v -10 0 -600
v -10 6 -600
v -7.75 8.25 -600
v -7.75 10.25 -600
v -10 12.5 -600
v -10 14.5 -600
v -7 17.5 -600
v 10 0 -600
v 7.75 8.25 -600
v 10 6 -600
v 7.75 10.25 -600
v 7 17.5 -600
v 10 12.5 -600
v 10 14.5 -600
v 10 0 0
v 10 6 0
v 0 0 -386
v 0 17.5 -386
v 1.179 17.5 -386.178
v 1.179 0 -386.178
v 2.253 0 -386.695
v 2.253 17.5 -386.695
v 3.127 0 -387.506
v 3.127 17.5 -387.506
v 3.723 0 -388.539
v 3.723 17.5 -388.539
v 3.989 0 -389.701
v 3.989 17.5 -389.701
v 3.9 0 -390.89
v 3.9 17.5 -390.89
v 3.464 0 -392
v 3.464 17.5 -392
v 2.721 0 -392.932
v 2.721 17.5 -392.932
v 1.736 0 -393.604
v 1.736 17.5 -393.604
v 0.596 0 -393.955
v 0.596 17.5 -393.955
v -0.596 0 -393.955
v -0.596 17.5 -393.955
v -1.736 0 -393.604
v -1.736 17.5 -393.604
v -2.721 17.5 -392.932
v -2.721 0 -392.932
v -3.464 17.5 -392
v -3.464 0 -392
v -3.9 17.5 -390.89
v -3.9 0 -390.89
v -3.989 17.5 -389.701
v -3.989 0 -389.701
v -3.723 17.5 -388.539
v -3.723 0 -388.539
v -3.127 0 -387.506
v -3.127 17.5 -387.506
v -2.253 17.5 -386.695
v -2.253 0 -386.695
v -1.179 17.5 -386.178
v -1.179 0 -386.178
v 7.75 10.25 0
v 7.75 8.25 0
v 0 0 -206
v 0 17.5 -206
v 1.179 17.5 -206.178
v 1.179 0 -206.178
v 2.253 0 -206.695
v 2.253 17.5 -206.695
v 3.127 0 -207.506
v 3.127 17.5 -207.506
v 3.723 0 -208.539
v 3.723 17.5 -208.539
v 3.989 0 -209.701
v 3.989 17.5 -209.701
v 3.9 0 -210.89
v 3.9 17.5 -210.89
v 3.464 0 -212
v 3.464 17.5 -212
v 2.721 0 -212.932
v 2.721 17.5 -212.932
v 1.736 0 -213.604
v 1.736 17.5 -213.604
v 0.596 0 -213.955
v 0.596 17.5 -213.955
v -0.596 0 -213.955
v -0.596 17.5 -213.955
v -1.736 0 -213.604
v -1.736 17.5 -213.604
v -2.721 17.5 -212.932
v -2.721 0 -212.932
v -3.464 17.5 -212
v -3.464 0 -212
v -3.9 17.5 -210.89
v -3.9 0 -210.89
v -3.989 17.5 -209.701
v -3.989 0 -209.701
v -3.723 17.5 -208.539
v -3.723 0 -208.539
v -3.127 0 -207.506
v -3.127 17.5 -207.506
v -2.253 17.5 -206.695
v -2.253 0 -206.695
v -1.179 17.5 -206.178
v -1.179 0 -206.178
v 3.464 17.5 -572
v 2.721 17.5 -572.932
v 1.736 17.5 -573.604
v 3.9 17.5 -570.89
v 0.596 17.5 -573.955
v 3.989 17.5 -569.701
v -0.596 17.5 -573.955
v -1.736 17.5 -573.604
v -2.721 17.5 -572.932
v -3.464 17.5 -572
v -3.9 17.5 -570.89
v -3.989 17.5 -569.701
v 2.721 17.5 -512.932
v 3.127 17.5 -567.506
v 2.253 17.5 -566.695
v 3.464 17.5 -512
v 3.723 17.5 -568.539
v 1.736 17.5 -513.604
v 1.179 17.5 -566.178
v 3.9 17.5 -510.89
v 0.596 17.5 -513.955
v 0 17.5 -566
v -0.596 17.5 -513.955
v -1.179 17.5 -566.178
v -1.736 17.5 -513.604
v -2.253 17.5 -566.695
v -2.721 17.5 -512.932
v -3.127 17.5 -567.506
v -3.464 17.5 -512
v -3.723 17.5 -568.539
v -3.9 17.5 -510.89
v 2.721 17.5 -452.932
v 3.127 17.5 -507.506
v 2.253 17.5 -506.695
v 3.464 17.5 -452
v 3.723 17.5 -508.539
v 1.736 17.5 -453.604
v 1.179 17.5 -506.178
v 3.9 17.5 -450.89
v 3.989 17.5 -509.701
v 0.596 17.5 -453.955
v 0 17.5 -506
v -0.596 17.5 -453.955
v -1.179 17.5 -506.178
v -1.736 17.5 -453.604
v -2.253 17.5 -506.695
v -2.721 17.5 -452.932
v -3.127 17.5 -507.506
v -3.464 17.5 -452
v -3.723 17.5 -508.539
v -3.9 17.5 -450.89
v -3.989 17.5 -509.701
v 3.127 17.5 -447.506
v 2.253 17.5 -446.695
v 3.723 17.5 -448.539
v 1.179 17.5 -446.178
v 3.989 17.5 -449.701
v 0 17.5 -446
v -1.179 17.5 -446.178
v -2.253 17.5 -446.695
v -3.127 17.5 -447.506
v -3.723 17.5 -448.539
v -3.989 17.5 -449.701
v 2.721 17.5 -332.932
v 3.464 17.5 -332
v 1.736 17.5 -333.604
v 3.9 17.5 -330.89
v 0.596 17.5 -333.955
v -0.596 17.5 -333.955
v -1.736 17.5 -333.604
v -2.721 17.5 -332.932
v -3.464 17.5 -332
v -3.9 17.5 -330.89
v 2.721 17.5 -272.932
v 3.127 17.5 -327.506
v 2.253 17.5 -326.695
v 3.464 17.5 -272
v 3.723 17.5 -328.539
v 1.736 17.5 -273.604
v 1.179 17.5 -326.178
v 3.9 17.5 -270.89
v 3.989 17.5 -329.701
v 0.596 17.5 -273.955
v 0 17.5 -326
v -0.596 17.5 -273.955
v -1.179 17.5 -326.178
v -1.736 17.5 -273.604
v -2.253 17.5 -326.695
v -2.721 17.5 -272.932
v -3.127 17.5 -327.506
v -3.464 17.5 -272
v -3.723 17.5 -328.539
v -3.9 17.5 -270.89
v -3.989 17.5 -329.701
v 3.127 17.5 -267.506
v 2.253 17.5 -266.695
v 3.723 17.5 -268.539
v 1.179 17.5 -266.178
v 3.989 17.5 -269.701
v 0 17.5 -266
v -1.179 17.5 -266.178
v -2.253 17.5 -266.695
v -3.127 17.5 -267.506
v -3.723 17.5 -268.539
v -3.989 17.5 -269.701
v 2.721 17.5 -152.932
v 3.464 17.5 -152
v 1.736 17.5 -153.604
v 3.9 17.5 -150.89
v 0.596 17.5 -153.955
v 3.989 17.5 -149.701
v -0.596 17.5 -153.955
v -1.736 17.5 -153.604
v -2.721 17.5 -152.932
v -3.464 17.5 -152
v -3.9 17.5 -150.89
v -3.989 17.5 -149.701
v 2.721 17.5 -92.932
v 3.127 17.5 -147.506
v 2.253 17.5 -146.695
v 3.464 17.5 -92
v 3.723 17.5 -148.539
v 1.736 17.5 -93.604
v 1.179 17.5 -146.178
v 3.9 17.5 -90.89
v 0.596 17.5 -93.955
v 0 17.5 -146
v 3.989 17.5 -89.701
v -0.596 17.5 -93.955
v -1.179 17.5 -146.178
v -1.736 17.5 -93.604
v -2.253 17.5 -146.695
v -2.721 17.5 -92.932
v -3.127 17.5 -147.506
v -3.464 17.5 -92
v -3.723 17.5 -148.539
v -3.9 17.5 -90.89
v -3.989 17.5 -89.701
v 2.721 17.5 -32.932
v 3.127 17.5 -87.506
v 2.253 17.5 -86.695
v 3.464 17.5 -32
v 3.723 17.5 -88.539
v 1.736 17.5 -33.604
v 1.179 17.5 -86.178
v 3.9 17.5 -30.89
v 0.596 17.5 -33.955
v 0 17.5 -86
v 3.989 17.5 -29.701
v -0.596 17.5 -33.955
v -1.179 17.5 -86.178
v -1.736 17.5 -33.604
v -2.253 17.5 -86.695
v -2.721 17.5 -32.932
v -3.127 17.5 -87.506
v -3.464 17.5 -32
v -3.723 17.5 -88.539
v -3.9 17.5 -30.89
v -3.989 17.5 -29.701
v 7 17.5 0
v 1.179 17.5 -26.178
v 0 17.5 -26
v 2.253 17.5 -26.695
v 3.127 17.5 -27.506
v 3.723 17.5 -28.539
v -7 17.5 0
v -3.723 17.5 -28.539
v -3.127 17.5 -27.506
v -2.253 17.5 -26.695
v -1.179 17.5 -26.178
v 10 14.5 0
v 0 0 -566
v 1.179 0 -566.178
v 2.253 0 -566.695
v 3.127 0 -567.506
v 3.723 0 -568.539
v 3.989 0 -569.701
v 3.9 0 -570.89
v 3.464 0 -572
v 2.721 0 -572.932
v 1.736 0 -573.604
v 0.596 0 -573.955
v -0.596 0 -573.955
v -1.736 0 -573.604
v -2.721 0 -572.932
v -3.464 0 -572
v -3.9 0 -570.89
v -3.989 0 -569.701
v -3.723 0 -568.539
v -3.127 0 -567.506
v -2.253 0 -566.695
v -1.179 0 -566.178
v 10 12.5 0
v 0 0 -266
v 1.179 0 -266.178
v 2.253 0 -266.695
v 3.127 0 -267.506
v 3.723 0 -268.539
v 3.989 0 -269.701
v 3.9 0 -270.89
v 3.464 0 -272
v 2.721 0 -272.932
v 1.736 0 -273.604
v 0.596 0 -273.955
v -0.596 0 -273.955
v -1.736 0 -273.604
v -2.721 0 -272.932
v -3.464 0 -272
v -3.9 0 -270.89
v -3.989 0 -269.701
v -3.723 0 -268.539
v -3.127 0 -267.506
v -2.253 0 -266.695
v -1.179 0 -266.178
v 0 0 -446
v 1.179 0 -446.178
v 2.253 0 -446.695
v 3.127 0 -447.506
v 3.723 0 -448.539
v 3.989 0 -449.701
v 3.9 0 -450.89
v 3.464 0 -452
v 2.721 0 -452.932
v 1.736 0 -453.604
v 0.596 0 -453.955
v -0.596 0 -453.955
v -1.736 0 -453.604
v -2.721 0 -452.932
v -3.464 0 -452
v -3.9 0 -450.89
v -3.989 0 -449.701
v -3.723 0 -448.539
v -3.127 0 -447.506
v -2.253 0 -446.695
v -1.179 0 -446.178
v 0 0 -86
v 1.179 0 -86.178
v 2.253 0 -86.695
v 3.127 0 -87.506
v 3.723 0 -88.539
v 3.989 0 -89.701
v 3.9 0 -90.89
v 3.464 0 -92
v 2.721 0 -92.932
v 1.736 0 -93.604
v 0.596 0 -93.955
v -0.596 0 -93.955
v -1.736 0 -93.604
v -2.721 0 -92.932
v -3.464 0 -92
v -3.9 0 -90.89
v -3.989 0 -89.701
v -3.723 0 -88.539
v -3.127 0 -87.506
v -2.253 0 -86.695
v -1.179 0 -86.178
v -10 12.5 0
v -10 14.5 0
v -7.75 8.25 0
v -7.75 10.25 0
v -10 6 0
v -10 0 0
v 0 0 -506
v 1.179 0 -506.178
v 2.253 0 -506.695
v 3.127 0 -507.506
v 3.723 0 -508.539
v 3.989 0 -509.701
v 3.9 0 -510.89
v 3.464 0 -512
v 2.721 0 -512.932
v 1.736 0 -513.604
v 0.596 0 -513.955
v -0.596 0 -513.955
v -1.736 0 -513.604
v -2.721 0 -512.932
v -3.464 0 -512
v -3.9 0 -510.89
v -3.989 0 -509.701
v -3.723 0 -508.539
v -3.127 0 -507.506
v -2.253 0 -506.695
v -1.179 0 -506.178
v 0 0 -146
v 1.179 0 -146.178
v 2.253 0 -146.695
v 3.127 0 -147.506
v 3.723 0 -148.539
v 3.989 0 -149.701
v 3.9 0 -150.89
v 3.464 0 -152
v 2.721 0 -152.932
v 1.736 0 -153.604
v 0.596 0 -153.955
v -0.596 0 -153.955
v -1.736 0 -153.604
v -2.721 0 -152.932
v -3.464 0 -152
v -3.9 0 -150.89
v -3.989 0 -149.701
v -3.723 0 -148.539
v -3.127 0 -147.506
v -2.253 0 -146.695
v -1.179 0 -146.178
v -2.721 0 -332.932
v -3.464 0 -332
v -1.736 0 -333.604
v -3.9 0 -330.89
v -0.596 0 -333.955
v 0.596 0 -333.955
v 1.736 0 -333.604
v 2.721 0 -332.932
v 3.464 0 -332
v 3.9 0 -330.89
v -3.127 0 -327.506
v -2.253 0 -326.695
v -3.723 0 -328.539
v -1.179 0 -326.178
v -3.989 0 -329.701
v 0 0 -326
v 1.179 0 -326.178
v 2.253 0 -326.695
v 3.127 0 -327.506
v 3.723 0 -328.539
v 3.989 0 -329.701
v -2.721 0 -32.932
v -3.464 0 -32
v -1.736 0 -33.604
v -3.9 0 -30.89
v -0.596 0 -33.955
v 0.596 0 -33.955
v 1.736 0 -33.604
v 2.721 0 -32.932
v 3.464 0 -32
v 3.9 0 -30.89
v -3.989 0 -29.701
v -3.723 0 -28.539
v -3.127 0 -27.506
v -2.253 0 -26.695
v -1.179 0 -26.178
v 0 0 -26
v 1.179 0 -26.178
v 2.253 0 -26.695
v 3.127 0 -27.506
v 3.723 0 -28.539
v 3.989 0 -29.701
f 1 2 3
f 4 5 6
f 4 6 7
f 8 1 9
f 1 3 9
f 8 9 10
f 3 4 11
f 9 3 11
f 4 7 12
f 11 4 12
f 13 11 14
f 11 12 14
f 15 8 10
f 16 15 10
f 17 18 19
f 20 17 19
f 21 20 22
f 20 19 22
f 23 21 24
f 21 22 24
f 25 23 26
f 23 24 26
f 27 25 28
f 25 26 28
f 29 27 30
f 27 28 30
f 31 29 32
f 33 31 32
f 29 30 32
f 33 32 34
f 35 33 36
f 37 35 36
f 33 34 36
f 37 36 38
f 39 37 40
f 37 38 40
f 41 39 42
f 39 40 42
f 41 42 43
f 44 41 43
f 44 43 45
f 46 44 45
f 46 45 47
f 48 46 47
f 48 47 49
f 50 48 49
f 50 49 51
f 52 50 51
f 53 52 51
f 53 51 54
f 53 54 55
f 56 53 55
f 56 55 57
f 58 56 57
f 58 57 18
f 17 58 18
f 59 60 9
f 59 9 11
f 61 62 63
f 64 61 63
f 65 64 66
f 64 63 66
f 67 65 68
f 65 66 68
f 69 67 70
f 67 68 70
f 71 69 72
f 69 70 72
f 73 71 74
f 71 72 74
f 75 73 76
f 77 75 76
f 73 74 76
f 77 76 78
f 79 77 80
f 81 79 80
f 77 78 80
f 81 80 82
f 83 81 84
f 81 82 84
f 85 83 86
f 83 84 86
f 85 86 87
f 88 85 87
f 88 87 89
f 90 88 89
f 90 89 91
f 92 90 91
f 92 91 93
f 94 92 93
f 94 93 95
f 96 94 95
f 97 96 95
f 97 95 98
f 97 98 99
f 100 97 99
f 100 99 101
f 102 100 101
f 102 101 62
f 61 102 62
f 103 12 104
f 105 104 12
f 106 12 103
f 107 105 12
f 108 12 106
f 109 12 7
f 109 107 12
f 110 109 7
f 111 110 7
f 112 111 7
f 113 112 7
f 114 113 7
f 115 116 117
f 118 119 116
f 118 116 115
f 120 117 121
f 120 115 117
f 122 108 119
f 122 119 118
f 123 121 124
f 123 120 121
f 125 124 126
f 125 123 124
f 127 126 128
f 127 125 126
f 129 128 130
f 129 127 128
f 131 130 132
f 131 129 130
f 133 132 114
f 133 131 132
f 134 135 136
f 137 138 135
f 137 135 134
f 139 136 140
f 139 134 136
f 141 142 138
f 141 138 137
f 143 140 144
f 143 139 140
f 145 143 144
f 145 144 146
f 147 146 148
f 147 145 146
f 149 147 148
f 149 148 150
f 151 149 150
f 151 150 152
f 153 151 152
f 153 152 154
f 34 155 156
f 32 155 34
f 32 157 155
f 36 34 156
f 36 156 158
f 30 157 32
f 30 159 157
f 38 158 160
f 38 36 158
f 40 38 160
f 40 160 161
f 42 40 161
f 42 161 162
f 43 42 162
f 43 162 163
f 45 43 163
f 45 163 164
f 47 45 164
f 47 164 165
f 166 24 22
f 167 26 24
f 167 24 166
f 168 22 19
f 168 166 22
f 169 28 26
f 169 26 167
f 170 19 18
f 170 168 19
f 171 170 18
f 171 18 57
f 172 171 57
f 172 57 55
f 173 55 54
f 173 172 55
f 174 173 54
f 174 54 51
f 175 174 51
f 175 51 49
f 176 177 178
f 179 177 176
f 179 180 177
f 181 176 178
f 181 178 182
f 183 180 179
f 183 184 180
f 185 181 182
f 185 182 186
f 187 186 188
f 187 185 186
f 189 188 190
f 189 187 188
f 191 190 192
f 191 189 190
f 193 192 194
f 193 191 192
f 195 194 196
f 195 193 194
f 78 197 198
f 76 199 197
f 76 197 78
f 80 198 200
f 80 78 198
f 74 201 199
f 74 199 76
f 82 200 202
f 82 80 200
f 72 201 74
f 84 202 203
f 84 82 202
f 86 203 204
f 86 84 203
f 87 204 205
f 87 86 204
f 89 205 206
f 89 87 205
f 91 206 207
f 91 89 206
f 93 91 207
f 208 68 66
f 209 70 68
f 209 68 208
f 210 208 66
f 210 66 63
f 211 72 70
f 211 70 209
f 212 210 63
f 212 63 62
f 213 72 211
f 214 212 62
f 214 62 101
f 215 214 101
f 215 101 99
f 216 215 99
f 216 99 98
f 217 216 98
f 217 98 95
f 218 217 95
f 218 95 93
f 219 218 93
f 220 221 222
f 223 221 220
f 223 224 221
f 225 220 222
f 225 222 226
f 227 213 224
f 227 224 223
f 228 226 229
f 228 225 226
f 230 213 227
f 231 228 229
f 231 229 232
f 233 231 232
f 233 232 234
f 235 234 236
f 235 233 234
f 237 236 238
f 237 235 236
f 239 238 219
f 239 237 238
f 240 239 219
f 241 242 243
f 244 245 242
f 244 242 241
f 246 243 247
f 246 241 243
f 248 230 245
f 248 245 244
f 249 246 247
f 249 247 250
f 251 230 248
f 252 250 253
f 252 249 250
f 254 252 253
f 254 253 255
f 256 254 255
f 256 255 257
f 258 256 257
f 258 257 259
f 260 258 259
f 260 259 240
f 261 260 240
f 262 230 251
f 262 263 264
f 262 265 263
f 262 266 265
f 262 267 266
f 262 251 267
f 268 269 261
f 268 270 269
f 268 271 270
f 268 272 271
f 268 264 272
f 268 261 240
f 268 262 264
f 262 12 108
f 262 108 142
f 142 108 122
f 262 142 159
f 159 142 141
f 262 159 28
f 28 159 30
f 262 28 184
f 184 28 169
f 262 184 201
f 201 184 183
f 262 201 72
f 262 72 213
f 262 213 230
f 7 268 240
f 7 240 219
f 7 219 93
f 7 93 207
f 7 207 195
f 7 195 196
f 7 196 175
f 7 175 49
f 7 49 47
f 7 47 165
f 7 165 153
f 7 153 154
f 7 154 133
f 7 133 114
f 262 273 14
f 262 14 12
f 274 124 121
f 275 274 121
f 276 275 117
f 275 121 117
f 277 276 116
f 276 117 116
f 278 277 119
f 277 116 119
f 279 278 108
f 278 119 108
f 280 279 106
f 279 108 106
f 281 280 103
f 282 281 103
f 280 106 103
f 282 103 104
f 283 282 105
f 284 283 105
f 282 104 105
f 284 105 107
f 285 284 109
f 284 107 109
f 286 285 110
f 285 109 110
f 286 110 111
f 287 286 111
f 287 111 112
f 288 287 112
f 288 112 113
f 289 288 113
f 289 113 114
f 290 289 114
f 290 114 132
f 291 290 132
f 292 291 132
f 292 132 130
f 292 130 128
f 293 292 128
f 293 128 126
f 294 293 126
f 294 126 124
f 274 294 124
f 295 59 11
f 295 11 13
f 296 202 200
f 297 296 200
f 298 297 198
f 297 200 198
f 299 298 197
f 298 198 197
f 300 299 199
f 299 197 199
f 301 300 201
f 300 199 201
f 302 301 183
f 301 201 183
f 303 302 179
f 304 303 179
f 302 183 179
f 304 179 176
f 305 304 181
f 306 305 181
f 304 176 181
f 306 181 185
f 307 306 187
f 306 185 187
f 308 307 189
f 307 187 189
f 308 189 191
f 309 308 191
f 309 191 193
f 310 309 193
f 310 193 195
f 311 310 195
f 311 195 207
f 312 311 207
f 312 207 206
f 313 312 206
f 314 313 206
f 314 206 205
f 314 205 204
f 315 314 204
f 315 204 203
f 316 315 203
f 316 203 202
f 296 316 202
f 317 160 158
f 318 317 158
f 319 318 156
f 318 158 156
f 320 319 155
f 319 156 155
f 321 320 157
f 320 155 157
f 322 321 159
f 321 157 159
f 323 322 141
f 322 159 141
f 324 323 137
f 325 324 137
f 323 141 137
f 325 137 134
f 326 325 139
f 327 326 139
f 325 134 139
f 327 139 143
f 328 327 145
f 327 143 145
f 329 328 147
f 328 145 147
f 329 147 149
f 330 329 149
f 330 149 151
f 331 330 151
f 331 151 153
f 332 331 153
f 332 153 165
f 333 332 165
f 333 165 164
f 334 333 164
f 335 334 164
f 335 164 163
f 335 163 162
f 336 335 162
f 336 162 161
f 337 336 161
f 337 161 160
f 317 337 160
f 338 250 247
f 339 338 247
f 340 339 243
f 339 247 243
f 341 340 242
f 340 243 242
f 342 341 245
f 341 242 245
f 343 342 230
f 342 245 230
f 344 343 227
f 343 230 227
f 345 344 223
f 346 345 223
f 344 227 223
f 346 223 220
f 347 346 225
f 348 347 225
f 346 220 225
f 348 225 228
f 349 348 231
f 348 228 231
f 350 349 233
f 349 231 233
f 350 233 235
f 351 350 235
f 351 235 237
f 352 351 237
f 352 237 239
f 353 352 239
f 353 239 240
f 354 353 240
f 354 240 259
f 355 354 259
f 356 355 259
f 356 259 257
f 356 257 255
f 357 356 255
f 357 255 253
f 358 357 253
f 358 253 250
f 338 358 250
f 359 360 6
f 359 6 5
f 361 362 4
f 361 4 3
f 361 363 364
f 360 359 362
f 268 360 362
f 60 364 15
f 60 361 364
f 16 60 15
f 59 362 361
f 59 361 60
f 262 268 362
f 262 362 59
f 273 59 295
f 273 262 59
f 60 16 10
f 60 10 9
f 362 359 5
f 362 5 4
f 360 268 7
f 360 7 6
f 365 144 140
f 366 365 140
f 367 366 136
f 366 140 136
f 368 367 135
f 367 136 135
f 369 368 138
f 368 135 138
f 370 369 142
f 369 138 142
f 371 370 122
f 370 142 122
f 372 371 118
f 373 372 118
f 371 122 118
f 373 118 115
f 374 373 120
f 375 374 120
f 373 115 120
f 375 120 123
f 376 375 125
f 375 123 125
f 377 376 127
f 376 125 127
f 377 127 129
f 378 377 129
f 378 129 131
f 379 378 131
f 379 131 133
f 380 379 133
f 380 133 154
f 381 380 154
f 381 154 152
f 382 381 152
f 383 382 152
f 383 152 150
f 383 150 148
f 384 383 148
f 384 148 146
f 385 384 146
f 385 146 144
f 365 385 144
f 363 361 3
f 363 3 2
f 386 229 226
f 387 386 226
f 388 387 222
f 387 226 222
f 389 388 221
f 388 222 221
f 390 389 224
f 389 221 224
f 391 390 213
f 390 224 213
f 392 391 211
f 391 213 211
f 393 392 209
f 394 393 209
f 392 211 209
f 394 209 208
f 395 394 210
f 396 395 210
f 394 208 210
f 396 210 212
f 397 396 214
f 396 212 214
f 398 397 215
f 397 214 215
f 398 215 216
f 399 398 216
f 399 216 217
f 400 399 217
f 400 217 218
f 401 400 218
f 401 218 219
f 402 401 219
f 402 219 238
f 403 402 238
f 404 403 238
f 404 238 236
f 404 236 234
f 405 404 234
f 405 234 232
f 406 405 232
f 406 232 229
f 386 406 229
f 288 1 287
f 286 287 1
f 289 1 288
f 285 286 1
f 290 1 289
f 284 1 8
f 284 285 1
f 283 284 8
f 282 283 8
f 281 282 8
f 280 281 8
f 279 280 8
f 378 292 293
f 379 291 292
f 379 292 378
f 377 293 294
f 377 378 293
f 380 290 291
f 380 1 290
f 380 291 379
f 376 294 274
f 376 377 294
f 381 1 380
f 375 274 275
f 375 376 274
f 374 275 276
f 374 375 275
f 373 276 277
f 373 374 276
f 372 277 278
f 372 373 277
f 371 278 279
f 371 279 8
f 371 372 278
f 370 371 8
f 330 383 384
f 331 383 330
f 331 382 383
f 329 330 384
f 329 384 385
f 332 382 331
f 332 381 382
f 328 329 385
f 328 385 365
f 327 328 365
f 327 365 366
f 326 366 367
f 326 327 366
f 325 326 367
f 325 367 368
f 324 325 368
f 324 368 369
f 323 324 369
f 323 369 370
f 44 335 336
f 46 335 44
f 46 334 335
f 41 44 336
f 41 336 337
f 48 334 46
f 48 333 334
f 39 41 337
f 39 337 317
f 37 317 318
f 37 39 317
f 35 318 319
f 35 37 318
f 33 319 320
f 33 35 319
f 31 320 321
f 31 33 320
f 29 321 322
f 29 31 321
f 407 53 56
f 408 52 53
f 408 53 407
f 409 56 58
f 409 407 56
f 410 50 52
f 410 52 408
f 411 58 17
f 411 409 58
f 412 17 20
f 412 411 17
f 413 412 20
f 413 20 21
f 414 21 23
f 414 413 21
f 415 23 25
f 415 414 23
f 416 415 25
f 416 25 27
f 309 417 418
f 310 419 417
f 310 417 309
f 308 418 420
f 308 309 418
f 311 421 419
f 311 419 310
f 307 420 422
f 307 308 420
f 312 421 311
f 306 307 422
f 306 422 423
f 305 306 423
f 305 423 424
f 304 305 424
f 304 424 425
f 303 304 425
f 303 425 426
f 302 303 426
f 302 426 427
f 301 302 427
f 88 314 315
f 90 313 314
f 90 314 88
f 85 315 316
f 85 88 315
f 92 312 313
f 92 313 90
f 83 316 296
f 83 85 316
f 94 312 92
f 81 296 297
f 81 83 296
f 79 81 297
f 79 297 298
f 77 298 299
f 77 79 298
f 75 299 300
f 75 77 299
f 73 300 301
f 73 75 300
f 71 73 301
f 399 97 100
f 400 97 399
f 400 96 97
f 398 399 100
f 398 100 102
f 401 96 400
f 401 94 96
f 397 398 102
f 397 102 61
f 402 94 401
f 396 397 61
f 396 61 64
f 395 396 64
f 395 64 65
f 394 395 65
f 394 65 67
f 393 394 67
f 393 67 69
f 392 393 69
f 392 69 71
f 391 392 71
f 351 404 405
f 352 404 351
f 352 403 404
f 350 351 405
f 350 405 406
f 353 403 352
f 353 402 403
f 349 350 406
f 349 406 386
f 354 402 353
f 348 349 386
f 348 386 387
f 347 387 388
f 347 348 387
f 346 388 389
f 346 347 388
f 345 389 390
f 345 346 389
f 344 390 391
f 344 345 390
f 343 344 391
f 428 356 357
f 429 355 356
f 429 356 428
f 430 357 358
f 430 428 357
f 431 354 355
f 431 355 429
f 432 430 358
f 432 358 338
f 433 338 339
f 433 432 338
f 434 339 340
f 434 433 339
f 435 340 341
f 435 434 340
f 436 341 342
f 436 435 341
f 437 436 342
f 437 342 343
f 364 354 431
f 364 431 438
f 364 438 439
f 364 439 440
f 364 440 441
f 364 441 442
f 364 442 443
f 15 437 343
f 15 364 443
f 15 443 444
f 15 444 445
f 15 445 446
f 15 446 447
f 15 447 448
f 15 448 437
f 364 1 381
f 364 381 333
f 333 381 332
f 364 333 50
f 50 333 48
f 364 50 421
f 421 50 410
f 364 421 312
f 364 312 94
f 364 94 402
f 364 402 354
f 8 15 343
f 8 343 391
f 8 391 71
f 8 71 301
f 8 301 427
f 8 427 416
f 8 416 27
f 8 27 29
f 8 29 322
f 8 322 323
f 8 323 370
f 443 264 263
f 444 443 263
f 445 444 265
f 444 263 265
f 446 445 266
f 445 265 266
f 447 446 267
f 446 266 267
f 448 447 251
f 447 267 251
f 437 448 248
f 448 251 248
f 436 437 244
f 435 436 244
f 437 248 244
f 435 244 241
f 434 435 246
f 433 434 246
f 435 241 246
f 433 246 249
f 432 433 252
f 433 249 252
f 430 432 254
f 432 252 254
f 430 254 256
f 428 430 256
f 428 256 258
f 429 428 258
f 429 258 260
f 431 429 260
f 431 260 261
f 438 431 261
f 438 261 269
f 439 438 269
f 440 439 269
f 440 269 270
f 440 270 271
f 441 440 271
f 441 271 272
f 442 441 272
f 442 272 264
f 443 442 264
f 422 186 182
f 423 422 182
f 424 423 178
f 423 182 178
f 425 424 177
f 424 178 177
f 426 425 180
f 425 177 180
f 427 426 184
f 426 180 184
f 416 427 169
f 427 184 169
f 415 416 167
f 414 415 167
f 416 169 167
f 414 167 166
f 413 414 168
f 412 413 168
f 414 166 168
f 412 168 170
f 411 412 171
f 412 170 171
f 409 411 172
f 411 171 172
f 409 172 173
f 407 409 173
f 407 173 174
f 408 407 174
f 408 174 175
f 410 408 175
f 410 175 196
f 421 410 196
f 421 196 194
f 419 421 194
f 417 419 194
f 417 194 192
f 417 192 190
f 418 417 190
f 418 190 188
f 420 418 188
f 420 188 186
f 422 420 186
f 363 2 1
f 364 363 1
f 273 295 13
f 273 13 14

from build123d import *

# Parameters (mm, degrees)
BOSS_EXTRUDE1_DEPTH = 600
SKETCH2_R           = 4
CUT_EXTRUDE1_DEPTH  = 26


with BuildPart() as part:
    # Sketch1 → Boss-Extrude1 (new body)
    with BuildSketch(Plane.XY):
        Polygon((-10, 0), (0, 0), (0, 17.5), (-7, 17.5), (-10, 14.5), (-10, 12.5), (-7.75, 10.25), (-7.75, 8.25), (-10, 6), align=None)
        Polygon((0, 17.5), (0, 0), (10, 0), (10, 6), (7.75, 8.25), (7.75, 10.25), (10, 12.5), (10, 14.5), (7, 17.5), align=None)
    extrude(amount=-BOSS_EXTRUDE1_DEPTH)

    # Sketch2 → Cut-Extrude1 (cut)
    with BuildSketch(Plane(origin=(0, 17.5, 0), x_dir=(1, 0, 0), z_dir=(0, 1, 0))):
        with Locations(Location((0, 30, 0), (0, 0, 270))):
            Circle(SKETCH2_R)
        with Locations(Location((0, 90, 0), (0, 0, 270))):
            Circle(SKETCH2_R)
        with Locations(Location((0, 150, 0), (0, 0, 270))):
            Circle(SKETCH2_R)
        with Locations(Location((0, 210, 0), (0, 0, 270))):
            Circle(SKETCH2_R)
        with Locations(Location((0, 270, 0), (0, 0, 270))):
            Circle(SKETCH2_R)
        with Locations(Location((0, 330, 0), (0, 0, 270))):
            Circle(SKETCH2_R)
        with Locations(Location((0, 390, 0), (0, 0, 270))):
            Circle(SKETCH2_R)
        with Locations(Location((0, 450, 0), (0, 0, 270))):
            Circle(SKETCH2_R)
        with Locations(Location((0, 510, 0), (0, 0, 270))):
            Circle(SKETCH2_R)
        with Locations(Location((0, 570, 0), (0, 0, 270))):
            Circle(SKETCH2_R)
    extrude(amount=-CUT_EXTRUDE1_DEPTH, mode=Mode.SUBTRACT)


solid = part.part
